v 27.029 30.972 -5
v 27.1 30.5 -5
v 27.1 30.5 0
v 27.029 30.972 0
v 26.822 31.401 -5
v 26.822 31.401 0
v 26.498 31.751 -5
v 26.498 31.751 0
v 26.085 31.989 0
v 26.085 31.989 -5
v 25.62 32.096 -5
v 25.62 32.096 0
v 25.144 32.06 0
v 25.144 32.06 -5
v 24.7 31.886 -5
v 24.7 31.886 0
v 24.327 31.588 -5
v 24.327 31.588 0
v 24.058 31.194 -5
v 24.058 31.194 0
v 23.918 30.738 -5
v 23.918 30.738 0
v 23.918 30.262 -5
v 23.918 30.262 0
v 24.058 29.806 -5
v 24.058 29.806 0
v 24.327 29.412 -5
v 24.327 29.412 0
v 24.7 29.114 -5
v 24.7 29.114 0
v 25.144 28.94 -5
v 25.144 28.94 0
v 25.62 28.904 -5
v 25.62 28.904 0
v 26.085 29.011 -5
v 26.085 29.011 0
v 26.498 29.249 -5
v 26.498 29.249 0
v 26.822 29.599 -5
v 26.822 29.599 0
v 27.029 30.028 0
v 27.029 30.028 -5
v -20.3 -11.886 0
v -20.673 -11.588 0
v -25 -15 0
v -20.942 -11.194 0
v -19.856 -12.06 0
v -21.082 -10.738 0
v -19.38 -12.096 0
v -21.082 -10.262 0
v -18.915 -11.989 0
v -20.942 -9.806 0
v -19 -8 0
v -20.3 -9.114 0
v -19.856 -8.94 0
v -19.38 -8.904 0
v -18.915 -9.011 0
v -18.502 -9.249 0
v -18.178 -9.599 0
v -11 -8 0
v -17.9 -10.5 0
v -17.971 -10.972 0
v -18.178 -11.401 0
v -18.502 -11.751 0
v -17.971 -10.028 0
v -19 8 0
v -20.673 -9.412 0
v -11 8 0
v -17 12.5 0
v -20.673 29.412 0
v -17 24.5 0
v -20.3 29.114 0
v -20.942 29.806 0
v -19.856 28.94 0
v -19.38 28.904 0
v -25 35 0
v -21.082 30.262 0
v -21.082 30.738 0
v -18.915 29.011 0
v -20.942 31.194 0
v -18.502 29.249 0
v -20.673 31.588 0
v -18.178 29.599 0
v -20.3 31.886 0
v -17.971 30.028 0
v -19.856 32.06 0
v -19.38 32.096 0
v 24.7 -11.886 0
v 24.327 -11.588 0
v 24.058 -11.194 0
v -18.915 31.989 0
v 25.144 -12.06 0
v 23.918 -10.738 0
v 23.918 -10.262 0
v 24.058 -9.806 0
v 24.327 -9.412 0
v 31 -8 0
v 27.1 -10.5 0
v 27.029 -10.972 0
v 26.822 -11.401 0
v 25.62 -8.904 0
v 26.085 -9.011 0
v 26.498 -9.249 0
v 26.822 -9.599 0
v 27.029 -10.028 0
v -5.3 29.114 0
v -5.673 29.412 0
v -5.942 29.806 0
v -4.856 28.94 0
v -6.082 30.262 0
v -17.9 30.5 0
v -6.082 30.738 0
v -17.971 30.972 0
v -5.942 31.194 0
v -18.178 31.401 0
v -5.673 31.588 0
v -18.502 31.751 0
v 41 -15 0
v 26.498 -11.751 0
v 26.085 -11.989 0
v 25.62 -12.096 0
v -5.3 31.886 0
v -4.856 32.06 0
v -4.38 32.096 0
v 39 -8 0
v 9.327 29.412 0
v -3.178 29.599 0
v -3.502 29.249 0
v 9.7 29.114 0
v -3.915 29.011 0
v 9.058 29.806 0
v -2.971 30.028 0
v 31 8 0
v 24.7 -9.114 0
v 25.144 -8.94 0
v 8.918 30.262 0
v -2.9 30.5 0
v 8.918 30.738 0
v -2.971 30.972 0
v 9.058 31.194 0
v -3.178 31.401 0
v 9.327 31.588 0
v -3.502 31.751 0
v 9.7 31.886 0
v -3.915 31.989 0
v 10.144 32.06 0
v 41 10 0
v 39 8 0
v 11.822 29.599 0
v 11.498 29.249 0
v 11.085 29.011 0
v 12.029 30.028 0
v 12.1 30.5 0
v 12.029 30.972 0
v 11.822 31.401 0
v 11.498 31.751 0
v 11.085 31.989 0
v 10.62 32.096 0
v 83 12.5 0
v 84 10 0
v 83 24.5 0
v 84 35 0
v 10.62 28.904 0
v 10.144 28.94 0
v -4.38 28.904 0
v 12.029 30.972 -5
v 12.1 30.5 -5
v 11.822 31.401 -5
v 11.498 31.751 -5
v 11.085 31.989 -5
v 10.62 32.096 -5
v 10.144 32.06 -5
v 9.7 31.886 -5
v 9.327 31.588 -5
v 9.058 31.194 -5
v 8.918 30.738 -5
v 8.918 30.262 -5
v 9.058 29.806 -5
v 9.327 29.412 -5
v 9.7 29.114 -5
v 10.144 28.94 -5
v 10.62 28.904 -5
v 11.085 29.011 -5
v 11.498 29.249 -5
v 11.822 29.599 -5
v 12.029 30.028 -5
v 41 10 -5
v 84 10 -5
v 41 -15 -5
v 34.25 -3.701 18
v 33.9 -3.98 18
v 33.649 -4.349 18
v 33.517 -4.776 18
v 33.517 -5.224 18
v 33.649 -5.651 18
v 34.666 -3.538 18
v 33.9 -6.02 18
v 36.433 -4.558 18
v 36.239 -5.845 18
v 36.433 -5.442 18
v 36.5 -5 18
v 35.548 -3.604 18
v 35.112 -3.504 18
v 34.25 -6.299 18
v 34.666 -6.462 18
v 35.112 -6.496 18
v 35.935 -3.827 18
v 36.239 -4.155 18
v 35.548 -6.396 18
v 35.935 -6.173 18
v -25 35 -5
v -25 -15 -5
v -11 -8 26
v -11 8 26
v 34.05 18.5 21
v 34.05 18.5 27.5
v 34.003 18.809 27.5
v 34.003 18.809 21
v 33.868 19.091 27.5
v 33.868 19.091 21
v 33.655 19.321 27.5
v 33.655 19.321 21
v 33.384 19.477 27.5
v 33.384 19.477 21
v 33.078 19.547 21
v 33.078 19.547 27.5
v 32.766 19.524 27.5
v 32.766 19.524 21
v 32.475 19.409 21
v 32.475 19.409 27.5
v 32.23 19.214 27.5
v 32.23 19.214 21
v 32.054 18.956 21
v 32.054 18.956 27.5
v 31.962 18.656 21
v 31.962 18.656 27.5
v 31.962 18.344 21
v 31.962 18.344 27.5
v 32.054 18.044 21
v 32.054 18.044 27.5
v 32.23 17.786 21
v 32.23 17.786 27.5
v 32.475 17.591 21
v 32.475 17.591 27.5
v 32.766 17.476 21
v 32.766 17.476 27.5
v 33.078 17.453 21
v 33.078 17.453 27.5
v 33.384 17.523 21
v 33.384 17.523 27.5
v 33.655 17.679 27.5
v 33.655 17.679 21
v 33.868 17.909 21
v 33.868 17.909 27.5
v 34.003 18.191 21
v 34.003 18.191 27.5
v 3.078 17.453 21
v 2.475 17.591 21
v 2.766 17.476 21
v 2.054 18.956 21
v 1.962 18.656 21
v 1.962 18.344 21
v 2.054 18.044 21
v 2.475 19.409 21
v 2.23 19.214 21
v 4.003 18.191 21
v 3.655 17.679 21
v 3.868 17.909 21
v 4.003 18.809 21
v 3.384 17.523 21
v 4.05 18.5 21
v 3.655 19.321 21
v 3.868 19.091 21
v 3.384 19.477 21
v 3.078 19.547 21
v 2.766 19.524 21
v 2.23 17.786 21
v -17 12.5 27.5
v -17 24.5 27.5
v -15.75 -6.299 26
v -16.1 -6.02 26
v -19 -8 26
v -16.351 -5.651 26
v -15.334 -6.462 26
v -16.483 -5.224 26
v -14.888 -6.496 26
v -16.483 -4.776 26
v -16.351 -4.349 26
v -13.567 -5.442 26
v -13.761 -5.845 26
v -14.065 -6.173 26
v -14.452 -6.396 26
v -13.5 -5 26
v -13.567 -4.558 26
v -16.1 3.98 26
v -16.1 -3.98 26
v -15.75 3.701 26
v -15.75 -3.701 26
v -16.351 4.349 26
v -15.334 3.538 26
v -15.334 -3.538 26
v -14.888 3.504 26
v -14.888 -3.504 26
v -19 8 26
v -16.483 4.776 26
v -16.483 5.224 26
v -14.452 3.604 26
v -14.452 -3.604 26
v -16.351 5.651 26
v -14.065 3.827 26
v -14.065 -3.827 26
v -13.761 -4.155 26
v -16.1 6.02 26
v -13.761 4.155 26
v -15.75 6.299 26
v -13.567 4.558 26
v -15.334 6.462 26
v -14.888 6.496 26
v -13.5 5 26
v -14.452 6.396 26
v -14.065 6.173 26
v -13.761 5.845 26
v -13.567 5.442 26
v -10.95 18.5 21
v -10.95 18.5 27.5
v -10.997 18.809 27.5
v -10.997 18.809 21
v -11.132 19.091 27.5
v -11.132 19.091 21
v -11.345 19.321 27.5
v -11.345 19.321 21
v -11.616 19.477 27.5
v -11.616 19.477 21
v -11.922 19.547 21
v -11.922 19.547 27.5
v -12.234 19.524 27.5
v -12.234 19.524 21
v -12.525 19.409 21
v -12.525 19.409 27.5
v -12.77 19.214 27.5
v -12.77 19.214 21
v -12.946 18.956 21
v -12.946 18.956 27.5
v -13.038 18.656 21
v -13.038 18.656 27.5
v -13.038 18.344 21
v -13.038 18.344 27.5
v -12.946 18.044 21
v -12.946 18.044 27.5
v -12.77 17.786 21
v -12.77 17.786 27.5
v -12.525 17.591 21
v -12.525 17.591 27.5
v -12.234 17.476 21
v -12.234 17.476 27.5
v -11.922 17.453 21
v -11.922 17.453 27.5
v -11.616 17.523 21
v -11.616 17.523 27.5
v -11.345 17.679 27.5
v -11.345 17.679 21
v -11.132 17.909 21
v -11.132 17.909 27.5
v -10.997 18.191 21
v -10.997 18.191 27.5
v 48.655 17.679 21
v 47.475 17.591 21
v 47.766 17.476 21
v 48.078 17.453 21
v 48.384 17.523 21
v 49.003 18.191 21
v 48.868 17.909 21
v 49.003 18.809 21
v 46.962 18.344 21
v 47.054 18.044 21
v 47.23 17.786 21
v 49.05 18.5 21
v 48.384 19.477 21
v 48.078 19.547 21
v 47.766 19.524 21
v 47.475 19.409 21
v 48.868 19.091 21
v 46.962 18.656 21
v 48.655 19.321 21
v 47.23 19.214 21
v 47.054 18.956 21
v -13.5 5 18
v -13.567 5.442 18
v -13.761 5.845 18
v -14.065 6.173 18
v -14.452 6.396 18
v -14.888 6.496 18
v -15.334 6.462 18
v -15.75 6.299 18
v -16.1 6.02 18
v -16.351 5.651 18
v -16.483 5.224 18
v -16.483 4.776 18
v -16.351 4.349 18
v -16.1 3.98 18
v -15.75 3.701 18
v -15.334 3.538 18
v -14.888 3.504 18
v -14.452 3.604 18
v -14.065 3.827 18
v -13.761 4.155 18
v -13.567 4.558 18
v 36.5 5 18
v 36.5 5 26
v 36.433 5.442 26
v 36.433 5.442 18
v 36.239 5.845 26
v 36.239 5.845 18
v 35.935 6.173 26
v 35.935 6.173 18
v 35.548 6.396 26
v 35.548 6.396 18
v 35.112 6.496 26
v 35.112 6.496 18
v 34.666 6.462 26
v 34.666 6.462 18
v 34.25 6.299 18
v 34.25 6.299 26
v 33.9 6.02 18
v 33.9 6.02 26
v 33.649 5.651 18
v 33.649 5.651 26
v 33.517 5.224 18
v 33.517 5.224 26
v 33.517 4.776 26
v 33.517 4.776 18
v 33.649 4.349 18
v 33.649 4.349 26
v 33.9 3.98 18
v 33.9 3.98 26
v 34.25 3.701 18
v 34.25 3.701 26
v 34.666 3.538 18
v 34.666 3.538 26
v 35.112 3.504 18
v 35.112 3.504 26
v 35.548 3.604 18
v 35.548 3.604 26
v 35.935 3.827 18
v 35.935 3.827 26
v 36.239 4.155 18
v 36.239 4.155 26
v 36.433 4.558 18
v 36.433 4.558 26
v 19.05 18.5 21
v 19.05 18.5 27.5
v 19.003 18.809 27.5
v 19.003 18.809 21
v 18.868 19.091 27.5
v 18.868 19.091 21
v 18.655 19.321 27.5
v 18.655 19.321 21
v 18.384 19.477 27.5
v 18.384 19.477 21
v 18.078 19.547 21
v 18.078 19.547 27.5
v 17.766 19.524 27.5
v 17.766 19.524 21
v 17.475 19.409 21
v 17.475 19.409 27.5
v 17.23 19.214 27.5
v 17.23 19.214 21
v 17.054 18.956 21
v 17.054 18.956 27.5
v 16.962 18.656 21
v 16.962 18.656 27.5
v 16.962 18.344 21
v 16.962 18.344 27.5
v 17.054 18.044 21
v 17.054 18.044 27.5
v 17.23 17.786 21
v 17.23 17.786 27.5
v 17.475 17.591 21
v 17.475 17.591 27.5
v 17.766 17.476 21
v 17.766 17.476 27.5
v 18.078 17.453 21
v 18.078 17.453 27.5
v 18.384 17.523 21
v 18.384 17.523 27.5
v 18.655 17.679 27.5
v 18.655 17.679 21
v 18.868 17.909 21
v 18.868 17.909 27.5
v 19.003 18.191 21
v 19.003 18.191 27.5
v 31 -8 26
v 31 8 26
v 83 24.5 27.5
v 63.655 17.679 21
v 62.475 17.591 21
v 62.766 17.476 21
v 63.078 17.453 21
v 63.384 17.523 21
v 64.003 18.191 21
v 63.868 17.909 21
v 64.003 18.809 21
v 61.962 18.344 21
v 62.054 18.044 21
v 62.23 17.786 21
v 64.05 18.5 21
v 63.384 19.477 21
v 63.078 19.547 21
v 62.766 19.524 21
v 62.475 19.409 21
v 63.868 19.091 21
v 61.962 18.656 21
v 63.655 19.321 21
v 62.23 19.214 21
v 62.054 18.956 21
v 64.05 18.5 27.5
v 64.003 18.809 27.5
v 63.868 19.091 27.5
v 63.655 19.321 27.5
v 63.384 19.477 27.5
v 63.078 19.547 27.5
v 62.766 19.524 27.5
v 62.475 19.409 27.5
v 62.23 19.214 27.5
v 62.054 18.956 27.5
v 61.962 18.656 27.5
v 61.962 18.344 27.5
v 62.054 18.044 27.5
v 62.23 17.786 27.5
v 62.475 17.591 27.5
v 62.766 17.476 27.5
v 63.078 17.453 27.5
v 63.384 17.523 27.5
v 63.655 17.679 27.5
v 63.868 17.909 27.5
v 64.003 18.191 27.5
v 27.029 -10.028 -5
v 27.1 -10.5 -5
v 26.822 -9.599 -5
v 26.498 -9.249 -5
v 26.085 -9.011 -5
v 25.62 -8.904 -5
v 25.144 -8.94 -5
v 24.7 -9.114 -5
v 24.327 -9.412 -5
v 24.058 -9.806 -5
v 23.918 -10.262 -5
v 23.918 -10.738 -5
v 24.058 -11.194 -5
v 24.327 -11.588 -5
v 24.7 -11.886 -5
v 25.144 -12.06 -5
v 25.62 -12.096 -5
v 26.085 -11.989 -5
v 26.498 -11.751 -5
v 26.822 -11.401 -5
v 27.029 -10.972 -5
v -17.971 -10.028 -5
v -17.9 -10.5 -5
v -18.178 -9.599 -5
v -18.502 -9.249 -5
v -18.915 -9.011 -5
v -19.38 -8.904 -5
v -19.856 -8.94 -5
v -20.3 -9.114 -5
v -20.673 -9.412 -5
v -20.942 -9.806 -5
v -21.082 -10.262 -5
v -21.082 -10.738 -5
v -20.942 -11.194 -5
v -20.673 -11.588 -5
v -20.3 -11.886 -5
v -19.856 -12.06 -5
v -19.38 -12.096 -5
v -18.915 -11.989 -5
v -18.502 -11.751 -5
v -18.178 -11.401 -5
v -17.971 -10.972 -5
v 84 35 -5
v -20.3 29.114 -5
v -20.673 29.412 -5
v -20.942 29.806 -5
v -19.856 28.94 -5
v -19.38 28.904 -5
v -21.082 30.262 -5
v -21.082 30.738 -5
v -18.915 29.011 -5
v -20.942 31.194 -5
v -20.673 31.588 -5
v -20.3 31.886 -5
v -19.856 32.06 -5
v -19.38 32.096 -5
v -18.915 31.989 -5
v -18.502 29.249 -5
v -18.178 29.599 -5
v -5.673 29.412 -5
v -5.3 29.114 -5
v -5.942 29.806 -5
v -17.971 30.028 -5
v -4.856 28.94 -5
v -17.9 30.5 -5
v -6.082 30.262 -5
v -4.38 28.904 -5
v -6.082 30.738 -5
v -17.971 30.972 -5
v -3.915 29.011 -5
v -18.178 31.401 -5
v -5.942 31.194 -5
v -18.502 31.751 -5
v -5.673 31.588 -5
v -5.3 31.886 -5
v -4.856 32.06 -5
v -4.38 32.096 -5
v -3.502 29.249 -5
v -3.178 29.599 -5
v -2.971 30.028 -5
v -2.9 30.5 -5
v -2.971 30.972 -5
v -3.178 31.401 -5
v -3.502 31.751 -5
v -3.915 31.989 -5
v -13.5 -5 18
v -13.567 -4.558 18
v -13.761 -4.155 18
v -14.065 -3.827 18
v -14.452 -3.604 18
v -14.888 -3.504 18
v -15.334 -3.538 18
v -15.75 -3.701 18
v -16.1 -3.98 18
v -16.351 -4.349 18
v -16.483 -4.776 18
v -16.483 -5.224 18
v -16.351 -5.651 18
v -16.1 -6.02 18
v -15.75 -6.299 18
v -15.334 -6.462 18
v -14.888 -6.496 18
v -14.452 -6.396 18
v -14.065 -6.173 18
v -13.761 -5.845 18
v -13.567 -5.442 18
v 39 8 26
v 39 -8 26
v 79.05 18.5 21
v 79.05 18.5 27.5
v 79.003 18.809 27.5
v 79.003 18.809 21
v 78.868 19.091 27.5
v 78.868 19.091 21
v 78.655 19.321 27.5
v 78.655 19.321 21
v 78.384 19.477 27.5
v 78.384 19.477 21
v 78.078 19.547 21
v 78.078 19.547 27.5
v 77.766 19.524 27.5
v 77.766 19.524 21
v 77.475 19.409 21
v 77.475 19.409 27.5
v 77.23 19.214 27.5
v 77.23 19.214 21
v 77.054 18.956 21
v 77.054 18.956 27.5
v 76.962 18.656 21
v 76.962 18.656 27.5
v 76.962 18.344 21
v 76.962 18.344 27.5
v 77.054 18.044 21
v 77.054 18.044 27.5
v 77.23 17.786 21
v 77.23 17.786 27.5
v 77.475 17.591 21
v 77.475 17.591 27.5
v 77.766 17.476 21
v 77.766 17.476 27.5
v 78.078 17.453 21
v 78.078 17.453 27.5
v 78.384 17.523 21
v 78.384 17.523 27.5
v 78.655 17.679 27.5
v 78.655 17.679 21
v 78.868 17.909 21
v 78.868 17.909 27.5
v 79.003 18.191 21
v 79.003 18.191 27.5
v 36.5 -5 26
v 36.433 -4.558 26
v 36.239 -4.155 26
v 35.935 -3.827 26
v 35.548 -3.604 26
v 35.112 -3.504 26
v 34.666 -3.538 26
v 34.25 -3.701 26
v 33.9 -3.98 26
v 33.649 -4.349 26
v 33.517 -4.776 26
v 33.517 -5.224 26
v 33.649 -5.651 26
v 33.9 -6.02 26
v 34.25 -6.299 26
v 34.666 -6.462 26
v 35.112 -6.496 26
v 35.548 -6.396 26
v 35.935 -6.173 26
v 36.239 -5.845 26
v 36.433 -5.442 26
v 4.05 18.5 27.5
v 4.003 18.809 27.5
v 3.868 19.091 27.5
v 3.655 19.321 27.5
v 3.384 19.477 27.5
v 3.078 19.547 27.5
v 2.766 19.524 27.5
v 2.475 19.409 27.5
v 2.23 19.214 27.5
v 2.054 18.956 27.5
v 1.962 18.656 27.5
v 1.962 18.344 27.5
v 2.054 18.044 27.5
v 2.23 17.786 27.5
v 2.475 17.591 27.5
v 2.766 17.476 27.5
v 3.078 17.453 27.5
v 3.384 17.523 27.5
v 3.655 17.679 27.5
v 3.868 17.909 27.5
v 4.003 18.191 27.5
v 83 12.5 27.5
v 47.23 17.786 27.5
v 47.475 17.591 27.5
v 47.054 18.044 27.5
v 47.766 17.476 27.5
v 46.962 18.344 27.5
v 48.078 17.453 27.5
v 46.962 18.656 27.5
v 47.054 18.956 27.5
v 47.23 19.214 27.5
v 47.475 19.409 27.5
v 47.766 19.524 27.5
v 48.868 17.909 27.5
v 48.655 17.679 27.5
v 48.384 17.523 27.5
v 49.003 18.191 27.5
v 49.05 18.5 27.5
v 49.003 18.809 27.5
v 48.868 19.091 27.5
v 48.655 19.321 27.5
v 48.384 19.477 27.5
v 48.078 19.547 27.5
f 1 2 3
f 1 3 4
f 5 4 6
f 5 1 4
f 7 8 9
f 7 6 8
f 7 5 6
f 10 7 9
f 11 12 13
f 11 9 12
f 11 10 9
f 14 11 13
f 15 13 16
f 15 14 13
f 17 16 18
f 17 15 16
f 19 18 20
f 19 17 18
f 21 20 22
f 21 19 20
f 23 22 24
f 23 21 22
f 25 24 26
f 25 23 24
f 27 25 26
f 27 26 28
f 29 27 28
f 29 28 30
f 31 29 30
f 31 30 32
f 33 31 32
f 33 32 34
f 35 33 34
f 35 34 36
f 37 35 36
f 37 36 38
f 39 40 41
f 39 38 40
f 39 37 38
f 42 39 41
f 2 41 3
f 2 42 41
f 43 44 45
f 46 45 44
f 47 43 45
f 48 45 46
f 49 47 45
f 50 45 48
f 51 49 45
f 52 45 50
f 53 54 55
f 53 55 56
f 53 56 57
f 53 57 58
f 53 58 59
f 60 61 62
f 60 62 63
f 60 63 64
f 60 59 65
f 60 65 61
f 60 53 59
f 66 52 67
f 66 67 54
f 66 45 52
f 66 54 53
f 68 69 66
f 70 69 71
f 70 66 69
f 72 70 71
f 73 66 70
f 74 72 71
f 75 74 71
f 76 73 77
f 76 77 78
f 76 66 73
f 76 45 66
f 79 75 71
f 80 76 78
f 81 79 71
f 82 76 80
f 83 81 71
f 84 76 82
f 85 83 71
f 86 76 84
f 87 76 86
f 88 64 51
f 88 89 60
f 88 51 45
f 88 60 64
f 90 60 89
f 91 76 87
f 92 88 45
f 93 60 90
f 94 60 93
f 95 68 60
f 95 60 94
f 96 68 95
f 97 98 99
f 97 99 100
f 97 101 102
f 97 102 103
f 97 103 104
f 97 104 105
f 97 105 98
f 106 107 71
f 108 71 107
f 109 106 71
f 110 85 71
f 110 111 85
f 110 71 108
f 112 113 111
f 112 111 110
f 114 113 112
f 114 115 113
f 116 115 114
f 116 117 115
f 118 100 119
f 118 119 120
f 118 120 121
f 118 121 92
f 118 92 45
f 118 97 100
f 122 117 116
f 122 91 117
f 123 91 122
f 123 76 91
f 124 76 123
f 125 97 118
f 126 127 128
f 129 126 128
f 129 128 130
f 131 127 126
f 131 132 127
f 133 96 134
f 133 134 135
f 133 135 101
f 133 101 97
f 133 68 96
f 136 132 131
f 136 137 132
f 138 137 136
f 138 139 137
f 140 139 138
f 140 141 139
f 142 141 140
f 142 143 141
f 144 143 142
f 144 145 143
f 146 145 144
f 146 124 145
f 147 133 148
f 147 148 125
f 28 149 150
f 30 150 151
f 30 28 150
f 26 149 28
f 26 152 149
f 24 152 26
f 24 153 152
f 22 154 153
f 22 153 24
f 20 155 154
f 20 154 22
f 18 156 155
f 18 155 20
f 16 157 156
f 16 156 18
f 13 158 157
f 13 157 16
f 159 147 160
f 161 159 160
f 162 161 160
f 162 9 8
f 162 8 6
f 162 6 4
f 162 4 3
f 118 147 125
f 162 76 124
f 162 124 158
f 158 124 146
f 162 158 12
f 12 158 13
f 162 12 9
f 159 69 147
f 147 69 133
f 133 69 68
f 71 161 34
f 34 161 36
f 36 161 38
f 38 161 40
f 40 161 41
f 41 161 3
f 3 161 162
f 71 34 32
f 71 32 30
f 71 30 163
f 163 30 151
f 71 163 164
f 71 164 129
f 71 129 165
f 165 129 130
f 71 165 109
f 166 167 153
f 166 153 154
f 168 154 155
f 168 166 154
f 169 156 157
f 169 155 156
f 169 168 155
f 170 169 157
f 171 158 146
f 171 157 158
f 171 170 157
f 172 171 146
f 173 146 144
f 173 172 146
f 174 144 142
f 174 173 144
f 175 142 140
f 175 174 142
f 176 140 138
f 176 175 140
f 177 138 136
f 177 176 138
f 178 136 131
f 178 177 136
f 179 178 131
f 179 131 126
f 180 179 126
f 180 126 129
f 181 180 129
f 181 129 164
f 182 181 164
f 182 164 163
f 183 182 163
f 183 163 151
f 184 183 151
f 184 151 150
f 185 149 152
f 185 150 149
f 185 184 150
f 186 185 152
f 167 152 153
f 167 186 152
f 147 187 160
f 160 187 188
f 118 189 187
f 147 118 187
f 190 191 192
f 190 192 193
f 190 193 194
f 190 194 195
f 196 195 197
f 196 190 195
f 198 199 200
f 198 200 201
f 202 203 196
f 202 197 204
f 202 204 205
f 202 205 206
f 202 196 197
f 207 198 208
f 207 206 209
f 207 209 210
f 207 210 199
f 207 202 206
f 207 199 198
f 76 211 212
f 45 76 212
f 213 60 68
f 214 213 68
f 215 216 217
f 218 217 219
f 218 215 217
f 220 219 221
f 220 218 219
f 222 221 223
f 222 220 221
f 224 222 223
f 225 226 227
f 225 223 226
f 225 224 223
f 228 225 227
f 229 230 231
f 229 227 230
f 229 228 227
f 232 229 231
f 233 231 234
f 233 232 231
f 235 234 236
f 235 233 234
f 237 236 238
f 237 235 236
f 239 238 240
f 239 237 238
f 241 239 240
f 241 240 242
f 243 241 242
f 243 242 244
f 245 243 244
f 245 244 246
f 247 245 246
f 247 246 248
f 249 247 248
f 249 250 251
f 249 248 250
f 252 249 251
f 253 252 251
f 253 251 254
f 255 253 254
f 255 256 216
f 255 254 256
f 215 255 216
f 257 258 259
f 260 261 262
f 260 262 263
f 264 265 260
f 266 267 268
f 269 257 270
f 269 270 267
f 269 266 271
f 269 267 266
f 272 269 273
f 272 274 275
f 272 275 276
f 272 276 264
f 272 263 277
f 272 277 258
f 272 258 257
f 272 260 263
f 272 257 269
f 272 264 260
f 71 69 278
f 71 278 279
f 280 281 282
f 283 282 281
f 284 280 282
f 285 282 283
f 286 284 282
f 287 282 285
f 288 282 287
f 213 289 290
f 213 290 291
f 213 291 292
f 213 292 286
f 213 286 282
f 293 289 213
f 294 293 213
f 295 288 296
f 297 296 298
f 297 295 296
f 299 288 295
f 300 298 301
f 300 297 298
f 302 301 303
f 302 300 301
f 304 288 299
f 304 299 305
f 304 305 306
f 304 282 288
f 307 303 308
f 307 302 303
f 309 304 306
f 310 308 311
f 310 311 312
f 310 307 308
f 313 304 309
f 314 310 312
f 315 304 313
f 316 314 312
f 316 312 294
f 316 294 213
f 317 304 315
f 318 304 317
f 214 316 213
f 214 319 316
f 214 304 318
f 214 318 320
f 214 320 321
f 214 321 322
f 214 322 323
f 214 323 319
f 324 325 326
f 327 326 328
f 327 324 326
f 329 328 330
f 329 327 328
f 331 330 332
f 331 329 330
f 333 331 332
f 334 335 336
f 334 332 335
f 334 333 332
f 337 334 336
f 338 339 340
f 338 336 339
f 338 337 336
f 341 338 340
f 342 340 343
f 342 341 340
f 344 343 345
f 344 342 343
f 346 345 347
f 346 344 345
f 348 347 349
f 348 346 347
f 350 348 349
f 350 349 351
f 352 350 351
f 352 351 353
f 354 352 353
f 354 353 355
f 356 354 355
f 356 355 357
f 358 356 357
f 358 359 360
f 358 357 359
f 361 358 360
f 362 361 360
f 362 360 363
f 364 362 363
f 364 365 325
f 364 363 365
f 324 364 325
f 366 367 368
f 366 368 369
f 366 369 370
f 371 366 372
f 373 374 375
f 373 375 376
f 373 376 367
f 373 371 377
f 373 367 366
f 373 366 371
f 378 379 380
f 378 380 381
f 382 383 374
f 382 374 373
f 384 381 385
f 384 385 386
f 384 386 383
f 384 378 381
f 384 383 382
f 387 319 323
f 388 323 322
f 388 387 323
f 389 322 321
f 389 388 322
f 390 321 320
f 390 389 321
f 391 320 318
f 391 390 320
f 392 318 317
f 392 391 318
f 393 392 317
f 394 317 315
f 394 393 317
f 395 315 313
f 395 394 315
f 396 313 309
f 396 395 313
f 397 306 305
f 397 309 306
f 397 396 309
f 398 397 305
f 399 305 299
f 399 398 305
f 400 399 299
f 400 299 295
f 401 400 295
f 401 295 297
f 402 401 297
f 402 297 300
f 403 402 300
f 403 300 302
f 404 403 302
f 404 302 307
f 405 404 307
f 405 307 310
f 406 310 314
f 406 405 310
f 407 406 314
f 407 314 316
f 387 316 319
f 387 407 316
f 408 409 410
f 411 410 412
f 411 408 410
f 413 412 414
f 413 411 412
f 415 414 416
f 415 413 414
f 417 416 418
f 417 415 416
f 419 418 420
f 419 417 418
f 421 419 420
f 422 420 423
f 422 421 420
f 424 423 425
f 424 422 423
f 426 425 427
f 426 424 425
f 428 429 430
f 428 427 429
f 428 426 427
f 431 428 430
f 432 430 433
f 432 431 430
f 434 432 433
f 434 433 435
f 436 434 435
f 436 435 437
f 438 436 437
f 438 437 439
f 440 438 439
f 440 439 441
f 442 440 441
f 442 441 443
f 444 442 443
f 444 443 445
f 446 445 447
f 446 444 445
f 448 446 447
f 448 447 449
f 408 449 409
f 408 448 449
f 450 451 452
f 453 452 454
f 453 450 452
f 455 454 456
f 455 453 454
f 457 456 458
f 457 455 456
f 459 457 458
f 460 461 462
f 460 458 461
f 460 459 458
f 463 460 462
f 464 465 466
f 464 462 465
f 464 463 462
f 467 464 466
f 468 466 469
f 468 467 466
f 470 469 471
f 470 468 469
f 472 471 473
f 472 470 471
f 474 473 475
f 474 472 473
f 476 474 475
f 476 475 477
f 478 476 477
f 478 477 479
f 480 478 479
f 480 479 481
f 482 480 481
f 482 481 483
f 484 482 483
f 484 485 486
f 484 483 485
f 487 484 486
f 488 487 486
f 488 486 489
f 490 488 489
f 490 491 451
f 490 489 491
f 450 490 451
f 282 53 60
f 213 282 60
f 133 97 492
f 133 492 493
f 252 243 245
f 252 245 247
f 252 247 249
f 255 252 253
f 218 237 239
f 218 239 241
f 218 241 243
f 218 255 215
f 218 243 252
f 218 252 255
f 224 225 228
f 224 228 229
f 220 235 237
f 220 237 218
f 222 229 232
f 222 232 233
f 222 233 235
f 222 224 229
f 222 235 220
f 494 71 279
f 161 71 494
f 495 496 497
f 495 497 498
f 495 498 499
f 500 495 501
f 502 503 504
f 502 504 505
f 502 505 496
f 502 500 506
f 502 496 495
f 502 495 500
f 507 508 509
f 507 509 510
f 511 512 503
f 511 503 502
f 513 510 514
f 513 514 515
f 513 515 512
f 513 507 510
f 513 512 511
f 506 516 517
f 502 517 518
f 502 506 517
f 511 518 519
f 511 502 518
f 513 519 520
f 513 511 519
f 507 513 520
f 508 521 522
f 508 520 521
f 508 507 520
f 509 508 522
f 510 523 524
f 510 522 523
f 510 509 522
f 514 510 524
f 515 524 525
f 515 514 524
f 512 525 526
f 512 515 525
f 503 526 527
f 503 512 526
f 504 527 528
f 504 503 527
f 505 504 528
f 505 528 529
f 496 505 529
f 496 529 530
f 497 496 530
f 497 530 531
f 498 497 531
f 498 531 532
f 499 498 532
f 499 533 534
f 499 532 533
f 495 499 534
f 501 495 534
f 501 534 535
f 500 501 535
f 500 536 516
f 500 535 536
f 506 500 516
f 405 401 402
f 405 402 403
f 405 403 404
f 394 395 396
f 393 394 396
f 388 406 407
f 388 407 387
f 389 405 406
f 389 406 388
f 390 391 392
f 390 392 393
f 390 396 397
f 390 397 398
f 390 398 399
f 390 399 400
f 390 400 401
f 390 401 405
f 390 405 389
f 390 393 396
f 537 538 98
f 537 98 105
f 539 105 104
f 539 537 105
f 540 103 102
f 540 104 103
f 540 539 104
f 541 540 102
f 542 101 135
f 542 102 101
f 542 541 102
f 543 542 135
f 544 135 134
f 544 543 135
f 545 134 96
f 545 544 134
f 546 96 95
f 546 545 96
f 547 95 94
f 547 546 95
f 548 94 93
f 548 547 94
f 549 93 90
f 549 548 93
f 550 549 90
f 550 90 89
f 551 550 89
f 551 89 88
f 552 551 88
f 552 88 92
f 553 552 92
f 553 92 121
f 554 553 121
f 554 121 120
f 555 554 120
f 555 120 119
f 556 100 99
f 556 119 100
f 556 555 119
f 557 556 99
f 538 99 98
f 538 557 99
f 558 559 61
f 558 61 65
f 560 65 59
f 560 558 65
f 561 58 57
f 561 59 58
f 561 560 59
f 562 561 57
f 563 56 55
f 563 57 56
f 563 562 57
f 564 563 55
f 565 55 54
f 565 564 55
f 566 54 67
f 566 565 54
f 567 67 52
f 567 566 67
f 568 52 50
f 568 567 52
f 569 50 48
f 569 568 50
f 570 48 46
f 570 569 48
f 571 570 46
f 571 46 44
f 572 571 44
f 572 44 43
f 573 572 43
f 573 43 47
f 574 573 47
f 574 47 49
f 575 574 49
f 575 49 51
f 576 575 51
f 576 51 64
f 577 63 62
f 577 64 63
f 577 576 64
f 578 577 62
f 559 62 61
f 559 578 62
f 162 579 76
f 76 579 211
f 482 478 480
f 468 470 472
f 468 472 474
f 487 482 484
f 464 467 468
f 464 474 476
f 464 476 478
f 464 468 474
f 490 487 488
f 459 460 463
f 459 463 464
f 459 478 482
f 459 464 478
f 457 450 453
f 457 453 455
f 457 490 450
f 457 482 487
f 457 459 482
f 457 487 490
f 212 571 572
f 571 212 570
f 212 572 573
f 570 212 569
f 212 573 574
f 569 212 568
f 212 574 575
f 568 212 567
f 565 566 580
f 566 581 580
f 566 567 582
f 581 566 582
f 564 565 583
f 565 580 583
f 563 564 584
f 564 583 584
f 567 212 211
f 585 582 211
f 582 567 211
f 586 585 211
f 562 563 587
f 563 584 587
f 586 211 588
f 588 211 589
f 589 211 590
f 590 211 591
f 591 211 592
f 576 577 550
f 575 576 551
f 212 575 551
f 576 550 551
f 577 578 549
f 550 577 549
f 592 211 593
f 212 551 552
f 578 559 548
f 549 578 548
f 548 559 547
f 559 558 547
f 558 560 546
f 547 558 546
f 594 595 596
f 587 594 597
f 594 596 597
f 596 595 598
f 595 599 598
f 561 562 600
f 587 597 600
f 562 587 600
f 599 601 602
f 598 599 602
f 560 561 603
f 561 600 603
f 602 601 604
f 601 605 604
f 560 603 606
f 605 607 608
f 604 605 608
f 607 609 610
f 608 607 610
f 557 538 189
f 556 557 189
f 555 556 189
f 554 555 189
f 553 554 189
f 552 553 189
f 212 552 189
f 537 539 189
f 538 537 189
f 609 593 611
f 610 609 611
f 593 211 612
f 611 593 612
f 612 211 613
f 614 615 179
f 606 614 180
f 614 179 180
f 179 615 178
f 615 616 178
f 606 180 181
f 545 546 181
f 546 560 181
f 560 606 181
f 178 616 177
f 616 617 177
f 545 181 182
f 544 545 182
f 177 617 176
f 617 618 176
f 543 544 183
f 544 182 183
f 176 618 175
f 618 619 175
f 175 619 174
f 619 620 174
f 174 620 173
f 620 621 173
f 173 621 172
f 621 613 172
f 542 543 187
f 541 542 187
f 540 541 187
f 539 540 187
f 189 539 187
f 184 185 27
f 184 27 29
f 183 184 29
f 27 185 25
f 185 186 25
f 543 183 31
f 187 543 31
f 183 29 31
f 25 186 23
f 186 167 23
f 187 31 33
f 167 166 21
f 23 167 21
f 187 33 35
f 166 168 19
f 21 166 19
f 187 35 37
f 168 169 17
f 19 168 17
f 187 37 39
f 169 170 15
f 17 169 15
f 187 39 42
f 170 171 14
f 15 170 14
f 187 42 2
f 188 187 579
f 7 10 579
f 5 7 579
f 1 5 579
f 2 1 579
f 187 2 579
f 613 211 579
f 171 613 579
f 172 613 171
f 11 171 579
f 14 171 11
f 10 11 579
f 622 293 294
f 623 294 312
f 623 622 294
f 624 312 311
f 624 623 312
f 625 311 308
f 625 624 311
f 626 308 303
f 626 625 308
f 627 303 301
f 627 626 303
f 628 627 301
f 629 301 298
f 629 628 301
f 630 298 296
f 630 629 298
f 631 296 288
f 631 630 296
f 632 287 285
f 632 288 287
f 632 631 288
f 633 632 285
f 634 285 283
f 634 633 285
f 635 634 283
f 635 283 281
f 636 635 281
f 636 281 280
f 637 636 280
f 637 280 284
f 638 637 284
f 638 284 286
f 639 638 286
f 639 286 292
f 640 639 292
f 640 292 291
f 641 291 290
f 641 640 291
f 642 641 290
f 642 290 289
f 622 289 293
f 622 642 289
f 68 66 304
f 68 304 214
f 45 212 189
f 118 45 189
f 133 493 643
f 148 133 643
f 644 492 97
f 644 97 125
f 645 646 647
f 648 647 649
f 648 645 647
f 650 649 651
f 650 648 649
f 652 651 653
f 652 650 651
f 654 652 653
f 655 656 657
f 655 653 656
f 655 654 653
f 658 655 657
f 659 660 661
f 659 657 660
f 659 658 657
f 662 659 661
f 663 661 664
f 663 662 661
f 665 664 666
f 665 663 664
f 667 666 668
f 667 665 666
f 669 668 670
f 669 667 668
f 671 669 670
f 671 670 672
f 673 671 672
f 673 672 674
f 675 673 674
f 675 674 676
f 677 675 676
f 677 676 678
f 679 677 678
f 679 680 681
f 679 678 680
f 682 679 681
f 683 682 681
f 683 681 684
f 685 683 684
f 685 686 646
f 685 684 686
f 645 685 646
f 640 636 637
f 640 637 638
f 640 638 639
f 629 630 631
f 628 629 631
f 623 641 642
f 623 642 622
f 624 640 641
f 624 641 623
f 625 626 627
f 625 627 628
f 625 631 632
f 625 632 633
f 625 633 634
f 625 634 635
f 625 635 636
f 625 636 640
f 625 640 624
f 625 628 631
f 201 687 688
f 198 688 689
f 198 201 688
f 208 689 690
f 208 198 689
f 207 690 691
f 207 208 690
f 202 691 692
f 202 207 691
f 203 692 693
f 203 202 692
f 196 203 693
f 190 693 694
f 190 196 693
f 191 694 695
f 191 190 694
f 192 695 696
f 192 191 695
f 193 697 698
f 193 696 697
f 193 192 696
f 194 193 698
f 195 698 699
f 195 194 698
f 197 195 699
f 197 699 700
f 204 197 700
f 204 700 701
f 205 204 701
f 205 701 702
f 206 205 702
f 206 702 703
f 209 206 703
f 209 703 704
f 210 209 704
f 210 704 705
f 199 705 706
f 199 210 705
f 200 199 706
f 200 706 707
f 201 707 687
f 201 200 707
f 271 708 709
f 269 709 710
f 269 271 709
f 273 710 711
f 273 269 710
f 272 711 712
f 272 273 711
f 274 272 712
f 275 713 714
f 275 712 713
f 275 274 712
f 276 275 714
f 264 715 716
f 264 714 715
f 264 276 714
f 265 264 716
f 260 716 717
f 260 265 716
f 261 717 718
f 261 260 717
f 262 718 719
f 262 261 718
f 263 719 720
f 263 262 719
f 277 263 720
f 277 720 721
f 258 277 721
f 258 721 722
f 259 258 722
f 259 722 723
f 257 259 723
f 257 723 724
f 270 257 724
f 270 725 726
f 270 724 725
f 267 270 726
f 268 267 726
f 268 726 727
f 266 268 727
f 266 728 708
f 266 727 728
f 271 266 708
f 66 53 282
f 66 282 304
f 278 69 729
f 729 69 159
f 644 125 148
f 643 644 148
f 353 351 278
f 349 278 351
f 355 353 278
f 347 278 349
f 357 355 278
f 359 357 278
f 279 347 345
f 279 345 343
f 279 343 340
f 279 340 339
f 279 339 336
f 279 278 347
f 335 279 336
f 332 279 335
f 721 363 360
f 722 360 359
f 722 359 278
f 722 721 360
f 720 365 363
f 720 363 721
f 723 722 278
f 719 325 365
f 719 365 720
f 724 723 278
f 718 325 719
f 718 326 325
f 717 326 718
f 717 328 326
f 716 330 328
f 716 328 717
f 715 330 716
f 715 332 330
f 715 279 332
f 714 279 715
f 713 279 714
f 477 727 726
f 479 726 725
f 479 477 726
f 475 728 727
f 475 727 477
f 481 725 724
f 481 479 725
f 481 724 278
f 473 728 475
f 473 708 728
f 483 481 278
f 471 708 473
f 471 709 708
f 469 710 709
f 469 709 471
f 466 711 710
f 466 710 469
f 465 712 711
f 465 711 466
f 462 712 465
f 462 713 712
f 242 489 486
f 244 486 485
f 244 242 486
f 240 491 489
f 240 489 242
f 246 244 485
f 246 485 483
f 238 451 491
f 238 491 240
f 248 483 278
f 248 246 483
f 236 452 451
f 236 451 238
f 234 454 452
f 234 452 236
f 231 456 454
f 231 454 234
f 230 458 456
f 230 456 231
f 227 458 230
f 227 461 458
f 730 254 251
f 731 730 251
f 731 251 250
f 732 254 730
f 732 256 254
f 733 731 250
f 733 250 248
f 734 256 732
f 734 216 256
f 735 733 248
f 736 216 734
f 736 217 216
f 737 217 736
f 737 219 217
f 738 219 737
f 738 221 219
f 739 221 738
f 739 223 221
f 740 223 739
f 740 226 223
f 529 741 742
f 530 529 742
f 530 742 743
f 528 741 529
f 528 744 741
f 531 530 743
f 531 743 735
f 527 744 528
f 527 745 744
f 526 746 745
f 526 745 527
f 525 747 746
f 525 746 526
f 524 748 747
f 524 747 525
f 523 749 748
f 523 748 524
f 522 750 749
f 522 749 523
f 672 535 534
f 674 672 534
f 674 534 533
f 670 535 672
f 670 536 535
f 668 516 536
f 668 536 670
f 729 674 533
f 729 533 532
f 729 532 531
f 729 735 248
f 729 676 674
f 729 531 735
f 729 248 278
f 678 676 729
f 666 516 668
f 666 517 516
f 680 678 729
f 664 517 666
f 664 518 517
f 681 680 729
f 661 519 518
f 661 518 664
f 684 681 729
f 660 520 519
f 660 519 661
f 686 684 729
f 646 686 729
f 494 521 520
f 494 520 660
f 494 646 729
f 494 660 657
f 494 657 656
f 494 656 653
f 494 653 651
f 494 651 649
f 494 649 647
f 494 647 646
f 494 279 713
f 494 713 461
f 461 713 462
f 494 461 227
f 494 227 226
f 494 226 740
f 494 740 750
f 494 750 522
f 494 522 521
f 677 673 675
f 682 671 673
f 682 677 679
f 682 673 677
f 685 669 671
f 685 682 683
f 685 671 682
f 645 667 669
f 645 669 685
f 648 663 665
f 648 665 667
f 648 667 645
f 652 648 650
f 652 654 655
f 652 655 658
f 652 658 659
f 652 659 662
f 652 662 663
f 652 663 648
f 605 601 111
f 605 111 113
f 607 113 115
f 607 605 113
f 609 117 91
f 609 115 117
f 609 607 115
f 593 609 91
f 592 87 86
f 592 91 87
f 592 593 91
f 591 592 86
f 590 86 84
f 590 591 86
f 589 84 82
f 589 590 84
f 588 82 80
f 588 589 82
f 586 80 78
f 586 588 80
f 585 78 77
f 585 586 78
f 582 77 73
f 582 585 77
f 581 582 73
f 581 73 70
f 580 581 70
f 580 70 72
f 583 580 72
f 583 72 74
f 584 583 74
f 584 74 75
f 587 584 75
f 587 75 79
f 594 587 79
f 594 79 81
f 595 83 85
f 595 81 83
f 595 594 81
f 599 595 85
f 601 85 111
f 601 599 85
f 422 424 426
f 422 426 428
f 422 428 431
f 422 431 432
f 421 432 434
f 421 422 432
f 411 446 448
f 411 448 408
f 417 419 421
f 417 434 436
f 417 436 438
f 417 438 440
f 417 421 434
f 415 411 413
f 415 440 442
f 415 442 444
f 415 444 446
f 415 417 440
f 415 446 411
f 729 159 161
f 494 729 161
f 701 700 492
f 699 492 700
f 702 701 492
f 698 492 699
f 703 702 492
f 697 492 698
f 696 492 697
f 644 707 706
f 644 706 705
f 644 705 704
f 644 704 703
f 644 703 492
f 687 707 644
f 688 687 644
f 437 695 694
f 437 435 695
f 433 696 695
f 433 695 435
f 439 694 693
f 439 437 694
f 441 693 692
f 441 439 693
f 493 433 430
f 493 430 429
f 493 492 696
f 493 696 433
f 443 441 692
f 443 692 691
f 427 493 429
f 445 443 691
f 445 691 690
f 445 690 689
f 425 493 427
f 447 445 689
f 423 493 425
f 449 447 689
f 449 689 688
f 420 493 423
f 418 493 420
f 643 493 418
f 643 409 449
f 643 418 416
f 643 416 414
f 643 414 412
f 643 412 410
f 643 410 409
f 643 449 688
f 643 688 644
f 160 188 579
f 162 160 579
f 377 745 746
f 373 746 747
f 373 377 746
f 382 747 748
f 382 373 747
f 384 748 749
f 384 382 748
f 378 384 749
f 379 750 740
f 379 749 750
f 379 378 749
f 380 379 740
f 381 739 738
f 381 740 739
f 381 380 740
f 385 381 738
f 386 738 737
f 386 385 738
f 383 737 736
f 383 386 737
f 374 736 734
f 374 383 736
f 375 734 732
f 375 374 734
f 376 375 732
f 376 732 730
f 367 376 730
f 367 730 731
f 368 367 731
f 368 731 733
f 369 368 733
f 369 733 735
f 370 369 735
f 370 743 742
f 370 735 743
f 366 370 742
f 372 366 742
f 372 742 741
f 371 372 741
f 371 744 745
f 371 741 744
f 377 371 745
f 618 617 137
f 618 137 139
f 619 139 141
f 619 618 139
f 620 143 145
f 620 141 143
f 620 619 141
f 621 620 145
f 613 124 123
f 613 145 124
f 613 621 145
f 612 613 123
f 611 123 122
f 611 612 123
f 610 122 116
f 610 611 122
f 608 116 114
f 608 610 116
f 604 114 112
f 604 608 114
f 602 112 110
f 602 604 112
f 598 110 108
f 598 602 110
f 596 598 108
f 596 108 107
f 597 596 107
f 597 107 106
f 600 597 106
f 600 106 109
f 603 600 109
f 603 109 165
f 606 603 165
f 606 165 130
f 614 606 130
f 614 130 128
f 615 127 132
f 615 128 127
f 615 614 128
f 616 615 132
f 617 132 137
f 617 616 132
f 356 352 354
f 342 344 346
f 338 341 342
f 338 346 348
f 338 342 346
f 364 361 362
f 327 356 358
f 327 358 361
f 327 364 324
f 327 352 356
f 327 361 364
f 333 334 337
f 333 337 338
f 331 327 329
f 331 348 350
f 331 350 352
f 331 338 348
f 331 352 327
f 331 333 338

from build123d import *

# Parameters (mm, degrees)
BASE_START                = -5
BASE_PLATE_DEPTH          = 5
MOUNTING_START            = -5.1
MOUNTING_HOLES_PROFILE_R  = 1.6
MOUNTING_HOLES_DEPTH      = 5.3
RAIL_SUPPORT_PROFILE_W    = 100
RAIL_SUPPORT_PROFILE_H    = 12
RAIL_SUPPORT_DEPTH        = 27.5
RAIL_START                = 21
RAIL_FASTENERS_PROFILE_R  = 1.05
RAIL_FASTENERS_DEPTH      = 6.6
SERVO_SUPPORTS_PROFILE_W  = 8
SERVO_SUPPORTS_PROFILE_H  = 16
SERVO_SUPPORTS_DEPTH      = 26
SERVO_START               = 18
SERVO_FASTENERS_PROFILE_R = 1.5
SERVO_FASTENERS_DEPTH     = 8.1


with BuildPart() as part:
    # Base plate profile → Base plate (new body)
    with BuildSketch(Plane.XY.offset(BASE_START)):
        Polygon((-25, -15), (41, -15), (41, 10), (84, 10), (84, 35), (10, 35), (-10, 35), (-25, 35), align=None)
    extrude(amount=BASE_PLATE_DEPTH)

    # Mounting holes profile → Mounting holes (cut)
    with BuildSketch(Plane.XY.offset(MOUNTING_START)):
        with Locations((-19.5, -10.5)):
            Circle(MOUNTING_HOLES_PROFILE_R)
        with Locations((-19.5, 30.5)):
            Circle(MOUNTING_HOLES_PROFILE_R)
        with Locations((25.5, -10.5)):
            Circle(MOUNTING_HOLES_PROFILE_R)
        with Locations((25.5, 30.5)):
            Circle(MOUNTING_HOLES_PROFILE_R)
        with Locations((-4.5, 30.5)):
            Circle(MOUNTING_HOLES_PROFILE_R)
        with Locations((10.5, 30.5)):
            Circle(MOUNTING_HOLES_PROFILE_R)
    extrude(amount=MOUNTING_HOLES_DEPTH, mode=Mode.SUBTRACT)

    # Rail support profile → Rail support (add)
    with BuildSketch(Plane.XY):
        with Locations((33, 18.5)):
            Rectangle(RAIL_SUPPORT_PROFILE_W, RAIL_SUPPORT_PROFILE_H)
    extrude(amount=RAIL_SUPPORT_DEPTH)

    # Rail fasteners profile → Rail fasteners (cut)
    with BuildSketch(Plane.XY.offset(RAIL_START)):
        with Locations((-12, 18.5)):
            Circle(RAIL_FASTENERS_PROFILE_R)
        with Locations((3, 18.5)):
            Circle(RAIL_FASTENERS_PROFILE_R)
        with Locations((18, 18.5)):
            Circle(RAIL_FASTENERS_PROFILE_R)
        with Locations((33, 18.5)):
            Circle(RAIL_FASTENERS_PROFILE_R)
        with Locations((48, 18.5)):
            Circle(RAIL_FASTENERS_PROFILE_R)
        with Locations((63, 18.5)):
            Circle(RAIL_FASTENERS_PROFILE_R)
        with Locations((78, 18.5)):
            Circle(RAIL_FASTENERS_PROFILE_R)
    extrude(amount=RAIL_FASTENERS_DEPTH, mode=Mode.SUBTRACT)

    # Servo supports profile → Servo supports (add)
    with BuildSketch(Plane.XY):
        with Locations((-15, 0)):
            Rectangle(SERVO_SUPPORTS_PROFILE_W, SERVO_SUPPORTS_PROFILE_H)
        with Locations((35, 0)):
            Rectangle(SERVO_SUPPORTS_PROFILE_W, SERVO_SUPPORTS_PROFILE_H)
    extrude(amount=SERVO_SUPPORTS_DEPTH)

    # Servo fasteners profile → Servo fasteners (cut)
    with BuildSketch(Plane.XY.offset(SERVO_START)):
        with Locations((-15, -5)):
            Circle(SERVO_FASTENERS_PROFILE_R)
        with Locations((-15, 5)):
            Circle(SERVO_FASTENERS_PROFILE_R)
        with Locations((35, -5)):
            Circle(SERVO_FASTENERS_PROFILE_R)
        with Locations((35, 5)):
            Circle(SERVO_FASTENERS_PROFILE_R)
    extrude(amount=SERVO_FASTENERS_DEPTH, mode=Mode.SUBTRACT)


solid = part.part
